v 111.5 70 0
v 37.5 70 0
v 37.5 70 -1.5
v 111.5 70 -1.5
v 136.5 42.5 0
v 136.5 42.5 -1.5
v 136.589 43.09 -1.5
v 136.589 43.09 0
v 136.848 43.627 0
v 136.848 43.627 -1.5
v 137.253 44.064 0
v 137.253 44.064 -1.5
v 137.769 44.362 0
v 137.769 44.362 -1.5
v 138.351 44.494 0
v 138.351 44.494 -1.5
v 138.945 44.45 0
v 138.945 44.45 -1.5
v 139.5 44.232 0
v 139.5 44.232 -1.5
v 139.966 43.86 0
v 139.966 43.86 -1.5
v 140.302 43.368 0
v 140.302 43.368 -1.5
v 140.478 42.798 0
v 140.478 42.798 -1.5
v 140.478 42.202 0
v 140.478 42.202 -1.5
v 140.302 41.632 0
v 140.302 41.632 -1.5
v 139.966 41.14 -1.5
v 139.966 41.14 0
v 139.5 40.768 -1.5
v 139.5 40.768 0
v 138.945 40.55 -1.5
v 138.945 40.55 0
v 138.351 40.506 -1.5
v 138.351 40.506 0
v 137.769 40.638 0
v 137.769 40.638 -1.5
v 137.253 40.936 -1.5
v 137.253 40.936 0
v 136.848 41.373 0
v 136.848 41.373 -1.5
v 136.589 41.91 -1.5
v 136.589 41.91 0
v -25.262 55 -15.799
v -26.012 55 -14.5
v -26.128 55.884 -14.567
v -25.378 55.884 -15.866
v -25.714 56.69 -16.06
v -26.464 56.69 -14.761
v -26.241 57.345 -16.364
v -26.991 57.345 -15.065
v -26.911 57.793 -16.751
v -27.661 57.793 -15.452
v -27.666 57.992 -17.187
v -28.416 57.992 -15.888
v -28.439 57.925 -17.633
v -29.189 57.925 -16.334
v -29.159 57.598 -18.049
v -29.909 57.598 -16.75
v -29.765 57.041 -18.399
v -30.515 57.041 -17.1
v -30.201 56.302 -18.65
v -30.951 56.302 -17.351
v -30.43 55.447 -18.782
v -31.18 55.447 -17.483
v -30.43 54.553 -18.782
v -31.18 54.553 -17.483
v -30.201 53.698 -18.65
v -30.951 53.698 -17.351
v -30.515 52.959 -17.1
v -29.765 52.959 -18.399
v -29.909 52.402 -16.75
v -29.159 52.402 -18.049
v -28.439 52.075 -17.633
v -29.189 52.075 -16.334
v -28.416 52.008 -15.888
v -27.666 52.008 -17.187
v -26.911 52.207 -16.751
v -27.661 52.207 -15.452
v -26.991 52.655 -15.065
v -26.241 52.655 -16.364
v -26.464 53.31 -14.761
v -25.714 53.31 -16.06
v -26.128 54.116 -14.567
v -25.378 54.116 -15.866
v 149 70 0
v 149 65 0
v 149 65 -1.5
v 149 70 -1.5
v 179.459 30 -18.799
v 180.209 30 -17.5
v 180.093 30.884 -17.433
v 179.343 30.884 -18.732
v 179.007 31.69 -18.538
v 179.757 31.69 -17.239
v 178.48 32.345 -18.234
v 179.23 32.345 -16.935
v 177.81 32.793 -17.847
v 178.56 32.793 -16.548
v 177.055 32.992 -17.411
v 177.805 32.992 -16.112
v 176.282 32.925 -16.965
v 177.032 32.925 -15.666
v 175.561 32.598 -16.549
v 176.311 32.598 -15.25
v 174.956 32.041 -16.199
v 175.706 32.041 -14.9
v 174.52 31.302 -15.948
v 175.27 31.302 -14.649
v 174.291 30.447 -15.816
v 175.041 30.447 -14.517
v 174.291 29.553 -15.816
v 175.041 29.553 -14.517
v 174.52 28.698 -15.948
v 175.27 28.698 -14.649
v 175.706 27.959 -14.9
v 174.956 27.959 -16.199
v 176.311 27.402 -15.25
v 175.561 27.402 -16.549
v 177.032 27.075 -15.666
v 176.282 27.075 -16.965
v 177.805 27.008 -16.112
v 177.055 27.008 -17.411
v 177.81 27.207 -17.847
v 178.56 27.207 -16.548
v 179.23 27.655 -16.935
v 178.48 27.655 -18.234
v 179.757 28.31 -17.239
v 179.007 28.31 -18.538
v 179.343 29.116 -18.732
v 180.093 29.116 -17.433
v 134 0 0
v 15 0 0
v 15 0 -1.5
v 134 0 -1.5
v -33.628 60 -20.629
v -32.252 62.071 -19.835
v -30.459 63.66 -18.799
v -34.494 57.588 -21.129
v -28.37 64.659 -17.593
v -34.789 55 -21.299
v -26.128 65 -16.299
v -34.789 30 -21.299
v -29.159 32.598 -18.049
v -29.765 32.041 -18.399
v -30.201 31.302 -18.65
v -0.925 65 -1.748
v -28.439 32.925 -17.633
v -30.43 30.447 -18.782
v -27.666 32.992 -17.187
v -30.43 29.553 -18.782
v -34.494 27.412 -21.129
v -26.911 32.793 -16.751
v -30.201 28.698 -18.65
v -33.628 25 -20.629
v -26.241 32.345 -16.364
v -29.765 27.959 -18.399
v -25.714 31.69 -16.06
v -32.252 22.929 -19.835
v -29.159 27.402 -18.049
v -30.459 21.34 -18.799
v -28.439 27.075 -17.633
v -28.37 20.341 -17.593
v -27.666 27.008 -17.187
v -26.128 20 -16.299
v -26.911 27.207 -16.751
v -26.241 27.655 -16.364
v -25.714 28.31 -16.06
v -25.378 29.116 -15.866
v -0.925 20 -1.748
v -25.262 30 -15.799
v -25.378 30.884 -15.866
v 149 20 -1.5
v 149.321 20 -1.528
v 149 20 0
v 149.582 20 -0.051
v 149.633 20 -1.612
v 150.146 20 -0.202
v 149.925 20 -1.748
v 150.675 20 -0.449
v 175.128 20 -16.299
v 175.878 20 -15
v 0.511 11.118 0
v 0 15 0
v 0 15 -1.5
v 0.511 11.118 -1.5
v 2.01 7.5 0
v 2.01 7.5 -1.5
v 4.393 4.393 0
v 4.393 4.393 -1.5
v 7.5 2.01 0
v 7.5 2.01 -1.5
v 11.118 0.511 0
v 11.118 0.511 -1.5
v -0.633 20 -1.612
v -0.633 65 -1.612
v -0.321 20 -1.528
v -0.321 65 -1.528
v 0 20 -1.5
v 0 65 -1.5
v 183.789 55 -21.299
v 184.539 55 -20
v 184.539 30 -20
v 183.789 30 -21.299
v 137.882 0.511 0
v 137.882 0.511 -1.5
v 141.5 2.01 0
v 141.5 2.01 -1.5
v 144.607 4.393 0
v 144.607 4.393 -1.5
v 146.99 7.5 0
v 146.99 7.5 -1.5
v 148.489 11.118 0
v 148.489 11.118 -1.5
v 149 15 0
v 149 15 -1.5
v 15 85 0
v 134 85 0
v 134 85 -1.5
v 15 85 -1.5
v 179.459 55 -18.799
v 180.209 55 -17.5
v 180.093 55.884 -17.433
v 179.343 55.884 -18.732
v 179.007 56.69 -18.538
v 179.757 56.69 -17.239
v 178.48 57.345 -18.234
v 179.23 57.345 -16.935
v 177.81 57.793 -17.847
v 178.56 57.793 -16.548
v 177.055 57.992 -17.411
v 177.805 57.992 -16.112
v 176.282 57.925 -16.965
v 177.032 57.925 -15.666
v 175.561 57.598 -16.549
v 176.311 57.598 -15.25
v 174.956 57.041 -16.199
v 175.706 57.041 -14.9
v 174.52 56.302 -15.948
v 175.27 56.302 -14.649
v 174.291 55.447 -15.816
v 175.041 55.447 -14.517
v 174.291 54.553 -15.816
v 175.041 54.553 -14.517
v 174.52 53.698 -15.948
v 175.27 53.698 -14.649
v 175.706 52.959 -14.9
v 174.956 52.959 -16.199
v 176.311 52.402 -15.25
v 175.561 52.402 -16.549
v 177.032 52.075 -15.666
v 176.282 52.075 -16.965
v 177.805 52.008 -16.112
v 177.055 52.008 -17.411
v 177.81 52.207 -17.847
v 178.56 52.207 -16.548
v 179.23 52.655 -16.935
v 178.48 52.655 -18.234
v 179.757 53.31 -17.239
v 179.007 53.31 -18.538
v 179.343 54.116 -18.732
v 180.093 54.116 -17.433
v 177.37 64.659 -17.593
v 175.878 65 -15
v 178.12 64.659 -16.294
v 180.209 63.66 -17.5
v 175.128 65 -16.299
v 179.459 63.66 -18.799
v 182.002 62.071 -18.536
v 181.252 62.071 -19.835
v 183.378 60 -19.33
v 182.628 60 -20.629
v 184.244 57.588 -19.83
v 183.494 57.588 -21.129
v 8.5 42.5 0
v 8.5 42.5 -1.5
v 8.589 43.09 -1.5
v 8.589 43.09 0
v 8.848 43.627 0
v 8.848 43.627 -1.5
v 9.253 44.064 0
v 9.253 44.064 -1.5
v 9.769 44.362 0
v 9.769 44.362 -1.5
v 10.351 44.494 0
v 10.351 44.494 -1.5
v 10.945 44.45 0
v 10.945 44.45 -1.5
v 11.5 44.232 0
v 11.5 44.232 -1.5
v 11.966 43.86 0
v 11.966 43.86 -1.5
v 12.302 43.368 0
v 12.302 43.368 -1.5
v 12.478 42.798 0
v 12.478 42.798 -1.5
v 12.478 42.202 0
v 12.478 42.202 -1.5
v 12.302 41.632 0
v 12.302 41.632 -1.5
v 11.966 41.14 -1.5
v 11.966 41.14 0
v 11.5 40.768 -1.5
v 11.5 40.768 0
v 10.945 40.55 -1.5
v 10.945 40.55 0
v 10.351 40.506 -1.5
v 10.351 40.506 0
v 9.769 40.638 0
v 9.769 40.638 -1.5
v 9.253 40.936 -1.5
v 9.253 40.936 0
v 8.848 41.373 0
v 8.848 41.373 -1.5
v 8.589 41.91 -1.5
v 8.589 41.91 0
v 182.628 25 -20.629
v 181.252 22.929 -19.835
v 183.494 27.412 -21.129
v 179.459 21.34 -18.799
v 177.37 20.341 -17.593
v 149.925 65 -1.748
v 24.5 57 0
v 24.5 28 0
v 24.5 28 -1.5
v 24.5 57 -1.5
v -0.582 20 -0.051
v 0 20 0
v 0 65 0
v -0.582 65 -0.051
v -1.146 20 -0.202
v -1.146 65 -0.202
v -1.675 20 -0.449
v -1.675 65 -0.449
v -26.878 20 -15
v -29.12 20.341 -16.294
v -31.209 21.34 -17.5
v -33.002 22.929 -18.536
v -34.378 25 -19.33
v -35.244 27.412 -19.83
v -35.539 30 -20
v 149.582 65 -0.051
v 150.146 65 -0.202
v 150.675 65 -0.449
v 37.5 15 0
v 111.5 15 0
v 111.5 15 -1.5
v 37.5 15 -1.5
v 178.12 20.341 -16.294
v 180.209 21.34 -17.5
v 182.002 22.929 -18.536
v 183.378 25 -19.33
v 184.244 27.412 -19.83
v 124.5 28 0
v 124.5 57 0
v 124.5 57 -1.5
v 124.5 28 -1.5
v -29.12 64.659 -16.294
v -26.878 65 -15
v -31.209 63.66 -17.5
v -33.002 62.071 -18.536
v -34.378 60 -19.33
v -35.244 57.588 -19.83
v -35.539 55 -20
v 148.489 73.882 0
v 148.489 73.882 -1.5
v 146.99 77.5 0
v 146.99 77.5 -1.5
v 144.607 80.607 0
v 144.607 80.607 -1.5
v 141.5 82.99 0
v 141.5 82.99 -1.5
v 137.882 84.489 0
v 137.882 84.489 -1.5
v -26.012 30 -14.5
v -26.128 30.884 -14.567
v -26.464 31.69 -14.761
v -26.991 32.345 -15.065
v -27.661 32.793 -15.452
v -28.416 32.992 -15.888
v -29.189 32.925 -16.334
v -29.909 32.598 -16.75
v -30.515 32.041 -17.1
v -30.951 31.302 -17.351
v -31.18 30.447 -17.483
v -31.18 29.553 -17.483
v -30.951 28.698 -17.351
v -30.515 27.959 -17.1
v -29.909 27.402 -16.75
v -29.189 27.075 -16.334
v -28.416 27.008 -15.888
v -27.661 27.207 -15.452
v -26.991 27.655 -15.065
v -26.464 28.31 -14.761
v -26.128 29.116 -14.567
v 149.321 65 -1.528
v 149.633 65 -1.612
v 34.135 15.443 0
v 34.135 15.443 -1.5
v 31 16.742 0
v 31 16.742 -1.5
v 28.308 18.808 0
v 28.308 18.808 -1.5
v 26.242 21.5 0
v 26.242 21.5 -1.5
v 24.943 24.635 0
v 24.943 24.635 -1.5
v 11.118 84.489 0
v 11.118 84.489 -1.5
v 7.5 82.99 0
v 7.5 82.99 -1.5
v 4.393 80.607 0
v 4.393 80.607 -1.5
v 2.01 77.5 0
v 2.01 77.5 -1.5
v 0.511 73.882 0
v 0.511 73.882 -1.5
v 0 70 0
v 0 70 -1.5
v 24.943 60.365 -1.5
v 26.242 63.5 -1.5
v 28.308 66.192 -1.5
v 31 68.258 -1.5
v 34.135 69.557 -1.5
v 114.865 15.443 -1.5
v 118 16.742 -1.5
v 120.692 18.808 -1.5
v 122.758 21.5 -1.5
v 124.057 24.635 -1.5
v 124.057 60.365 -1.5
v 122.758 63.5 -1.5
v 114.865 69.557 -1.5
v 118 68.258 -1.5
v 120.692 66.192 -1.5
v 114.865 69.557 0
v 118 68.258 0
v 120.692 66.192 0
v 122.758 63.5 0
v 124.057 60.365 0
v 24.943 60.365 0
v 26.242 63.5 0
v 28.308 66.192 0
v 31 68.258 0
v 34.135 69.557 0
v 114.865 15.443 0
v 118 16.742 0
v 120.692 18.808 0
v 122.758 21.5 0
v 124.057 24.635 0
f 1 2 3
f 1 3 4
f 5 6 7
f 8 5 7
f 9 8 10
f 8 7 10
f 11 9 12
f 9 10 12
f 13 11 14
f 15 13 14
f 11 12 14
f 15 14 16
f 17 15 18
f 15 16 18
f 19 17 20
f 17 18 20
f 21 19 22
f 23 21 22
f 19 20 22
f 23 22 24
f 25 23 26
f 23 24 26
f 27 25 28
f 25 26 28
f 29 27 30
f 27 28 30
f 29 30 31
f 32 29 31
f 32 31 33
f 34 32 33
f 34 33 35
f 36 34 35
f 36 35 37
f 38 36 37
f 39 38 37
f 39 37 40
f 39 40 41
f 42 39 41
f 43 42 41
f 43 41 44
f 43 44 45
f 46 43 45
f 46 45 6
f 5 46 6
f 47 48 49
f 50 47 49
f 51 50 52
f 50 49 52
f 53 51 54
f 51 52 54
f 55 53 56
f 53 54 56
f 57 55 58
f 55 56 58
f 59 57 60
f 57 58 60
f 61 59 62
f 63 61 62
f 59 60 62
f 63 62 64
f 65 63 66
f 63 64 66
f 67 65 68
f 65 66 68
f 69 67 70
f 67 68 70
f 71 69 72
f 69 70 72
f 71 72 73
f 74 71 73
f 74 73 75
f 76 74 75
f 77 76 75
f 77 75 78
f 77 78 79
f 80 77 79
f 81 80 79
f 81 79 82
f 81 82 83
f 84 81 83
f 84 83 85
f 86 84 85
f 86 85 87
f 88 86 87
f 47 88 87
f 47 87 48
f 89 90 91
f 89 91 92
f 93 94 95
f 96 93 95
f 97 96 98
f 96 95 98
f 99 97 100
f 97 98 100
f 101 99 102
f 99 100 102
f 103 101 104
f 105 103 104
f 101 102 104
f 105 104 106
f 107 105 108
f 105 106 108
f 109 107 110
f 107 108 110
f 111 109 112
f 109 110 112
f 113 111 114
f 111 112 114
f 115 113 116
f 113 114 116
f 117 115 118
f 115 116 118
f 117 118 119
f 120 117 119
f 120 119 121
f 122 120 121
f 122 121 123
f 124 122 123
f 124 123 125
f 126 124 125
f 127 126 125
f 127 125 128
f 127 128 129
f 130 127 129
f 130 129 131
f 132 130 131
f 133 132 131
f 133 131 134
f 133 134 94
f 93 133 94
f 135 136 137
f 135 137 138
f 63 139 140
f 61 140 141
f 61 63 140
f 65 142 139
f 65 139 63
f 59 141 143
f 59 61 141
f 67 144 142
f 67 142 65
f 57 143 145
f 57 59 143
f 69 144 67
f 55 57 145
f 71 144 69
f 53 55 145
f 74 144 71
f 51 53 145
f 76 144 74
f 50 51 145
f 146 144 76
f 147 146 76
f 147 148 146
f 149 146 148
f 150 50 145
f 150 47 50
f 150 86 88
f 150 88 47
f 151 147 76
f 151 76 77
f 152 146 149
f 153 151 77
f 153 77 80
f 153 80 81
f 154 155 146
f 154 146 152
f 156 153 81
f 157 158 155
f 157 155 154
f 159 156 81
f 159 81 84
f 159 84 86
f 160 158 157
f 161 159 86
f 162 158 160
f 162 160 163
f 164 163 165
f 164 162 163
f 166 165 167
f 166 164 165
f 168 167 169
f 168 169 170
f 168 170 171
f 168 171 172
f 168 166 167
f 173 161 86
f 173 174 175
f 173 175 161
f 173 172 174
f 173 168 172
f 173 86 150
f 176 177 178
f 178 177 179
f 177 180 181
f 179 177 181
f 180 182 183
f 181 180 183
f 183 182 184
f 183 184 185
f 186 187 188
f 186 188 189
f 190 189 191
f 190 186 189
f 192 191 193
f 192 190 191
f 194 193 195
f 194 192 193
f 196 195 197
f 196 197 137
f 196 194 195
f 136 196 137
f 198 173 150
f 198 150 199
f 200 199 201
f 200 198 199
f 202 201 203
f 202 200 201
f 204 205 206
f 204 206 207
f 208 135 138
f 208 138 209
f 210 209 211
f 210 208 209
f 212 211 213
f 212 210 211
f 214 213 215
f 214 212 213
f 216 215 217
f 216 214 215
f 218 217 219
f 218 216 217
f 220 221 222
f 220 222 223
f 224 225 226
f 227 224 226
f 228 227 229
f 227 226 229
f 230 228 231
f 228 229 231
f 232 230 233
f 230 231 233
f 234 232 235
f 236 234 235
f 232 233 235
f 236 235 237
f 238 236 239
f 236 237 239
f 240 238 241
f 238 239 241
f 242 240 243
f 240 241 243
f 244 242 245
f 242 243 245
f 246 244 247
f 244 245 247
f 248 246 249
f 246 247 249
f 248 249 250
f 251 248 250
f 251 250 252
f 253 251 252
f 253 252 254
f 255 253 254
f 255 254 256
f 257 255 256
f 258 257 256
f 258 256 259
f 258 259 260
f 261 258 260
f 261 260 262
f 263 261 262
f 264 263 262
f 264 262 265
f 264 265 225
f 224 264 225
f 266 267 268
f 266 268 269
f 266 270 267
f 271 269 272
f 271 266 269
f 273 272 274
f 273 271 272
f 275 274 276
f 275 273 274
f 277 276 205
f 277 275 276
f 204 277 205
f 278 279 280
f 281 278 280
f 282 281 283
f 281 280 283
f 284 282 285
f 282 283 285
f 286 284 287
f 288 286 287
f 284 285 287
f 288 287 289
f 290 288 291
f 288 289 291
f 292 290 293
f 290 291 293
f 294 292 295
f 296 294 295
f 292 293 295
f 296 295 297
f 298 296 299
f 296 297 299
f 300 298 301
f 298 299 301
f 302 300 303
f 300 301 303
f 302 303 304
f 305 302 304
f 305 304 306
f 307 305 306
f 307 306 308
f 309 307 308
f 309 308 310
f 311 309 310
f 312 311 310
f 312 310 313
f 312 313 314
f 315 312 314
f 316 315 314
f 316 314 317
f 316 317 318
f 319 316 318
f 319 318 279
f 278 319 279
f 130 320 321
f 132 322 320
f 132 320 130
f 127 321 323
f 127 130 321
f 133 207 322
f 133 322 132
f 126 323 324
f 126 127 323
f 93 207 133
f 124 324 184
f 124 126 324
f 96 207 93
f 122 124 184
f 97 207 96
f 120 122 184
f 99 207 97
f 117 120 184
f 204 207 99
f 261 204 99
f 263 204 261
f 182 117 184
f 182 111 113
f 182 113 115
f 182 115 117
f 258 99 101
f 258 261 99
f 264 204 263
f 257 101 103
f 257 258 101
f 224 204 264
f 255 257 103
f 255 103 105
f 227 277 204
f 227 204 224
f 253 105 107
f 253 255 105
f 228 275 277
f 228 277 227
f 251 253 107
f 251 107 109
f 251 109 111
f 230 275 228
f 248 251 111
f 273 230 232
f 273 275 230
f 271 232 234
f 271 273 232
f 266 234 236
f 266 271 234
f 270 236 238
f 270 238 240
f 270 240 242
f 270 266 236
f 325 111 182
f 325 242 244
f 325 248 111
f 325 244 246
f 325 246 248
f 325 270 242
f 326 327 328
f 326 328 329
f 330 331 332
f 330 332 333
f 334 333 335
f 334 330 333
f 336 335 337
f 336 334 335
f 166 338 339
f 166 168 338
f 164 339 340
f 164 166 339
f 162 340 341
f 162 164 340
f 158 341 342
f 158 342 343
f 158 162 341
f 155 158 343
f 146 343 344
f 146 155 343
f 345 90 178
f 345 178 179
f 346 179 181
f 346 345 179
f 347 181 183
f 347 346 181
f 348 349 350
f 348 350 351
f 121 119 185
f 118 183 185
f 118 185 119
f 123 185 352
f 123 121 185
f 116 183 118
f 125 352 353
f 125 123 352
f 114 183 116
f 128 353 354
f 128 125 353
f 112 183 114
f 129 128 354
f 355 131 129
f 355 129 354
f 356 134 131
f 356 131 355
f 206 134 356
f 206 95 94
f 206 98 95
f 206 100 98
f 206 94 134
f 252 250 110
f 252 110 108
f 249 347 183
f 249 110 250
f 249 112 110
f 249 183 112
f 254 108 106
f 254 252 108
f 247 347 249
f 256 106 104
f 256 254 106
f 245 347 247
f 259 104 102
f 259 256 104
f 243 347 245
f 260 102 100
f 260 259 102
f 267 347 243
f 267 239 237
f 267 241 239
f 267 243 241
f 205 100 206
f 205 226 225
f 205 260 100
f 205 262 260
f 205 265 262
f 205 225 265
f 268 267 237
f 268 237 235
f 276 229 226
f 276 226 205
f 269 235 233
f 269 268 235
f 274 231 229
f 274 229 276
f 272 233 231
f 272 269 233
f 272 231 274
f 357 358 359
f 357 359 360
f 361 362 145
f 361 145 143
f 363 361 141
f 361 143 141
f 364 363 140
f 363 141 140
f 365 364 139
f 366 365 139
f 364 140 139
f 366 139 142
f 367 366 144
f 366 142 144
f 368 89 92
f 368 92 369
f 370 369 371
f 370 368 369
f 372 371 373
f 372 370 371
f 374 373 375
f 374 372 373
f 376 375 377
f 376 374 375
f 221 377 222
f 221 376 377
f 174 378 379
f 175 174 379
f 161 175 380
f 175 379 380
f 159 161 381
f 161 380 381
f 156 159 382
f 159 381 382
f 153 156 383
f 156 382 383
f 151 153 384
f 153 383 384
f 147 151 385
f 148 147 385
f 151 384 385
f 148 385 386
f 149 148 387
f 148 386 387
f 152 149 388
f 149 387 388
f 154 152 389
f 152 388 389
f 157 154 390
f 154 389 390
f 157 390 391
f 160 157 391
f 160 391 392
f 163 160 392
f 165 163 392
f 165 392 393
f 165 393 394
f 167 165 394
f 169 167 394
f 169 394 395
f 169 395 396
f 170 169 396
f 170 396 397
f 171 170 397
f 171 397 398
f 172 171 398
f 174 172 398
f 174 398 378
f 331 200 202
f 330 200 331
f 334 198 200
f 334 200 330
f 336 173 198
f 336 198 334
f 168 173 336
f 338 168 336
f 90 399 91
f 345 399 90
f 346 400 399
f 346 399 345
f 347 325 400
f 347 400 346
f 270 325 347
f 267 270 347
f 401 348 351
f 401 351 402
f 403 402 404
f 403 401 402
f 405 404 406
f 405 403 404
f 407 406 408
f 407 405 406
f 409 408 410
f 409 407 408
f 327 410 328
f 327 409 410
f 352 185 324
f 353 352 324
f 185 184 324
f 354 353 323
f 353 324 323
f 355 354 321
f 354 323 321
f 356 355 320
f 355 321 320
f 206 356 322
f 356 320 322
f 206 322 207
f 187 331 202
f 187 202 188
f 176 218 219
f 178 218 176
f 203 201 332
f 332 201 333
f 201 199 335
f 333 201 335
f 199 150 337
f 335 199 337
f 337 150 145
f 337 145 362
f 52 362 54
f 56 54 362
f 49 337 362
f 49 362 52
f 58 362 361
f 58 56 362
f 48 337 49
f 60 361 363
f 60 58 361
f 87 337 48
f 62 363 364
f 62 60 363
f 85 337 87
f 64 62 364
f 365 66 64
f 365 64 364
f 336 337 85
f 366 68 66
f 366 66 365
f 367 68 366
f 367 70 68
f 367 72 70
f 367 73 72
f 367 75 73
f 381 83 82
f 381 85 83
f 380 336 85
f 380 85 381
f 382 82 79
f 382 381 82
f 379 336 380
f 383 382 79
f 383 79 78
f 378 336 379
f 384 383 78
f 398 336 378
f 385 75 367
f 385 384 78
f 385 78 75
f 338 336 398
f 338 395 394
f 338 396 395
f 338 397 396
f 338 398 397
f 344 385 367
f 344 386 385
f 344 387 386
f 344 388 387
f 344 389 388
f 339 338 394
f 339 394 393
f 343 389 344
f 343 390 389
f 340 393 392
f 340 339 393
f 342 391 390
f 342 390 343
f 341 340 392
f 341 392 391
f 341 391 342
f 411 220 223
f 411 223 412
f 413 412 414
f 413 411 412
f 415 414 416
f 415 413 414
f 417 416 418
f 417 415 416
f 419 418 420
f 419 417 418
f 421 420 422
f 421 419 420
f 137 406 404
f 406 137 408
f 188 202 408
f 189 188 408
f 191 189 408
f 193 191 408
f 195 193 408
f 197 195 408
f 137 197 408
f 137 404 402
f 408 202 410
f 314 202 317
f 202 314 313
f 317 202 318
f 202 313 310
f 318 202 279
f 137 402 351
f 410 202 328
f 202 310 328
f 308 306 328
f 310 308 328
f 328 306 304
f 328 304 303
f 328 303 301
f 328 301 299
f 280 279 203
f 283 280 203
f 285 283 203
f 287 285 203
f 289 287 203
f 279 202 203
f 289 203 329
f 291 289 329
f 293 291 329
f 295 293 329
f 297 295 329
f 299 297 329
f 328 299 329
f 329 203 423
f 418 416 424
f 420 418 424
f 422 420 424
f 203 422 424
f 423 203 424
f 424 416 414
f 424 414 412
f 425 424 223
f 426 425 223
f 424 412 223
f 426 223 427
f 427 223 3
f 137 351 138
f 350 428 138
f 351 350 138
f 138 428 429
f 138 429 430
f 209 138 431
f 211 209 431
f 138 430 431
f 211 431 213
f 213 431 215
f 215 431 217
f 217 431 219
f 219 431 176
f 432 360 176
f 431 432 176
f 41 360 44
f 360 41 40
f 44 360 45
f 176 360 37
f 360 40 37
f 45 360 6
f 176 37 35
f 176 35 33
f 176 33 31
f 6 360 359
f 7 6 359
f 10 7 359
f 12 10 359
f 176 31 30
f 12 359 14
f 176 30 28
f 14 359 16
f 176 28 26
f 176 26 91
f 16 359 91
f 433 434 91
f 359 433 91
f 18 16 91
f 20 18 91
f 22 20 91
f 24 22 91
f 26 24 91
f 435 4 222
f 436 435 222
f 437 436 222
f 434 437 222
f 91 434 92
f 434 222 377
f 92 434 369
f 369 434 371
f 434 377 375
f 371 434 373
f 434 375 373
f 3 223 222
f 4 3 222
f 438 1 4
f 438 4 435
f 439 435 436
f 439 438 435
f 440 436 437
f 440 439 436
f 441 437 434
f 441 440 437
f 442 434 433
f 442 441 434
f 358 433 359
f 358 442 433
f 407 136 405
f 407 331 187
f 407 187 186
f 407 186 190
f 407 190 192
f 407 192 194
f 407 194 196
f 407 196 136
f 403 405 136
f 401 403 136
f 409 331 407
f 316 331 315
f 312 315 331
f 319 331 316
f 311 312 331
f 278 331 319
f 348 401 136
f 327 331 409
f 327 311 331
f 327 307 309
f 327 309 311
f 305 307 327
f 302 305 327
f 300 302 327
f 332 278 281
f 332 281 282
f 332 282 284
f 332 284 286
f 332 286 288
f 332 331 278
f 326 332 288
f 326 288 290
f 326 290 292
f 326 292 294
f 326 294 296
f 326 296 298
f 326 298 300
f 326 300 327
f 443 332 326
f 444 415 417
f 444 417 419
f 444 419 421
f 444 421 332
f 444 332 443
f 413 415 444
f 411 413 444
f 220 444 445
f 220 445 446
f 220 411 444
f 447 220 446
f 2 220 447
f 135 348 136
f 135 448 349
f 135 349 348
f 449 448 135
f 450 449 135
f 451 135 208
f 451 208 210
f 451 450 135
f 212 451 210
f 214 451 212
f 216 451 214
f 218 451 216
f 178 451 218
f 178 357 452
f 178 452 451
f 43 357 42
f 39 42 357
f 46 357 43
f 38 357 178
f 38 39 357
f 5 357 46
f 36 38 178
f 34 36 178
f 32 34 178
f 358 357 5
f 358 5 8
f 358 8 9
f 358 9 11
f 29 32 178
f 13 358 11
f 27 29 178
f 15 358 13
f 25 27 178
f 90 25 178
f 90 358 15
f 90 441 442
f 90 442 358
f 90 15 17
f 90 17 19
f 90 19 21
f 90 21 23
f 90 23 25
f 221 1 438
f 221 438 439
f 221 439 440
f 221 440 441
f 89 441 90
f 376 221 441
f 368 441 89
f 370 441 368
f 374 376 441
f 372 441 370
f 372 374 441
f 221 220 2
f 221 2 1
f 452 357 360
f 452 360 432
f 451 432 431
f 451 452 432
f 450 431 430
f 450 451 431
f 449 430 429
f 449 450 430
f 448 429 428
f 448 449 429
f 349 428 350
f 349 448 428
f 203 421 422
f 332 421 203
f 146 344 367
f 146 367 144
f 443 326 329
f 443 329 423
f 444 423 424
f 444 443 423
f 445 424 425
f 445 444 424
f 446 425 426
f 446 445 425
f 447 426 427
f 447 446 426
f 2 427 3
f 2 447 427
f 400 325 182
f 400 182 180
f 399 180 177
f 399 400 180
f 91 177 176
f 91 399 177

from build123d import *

# Parameters (mm, degrees)
BASE_FLANGE1_DEPTH          = 1.5
SM_EDGE_FLANGE_1_DEPTH      = 45
SM_EDGE_FLANGE_1_BEND_DEPTH = 45
SKETCH12_R                  = 3
CUT_EXTRUDE1_DEPTH          = 10
FILLET1_R                   = 10
SKETCH13_R                  = 3
CUT_EXTRUDE2_DEPTH          = 10
SKETCH14_R                  = 2
CUT_EXTRUDE3_DEPTH          = 10


# Sheet-metal steps are written as plain solids
with BuildPart() as part:
    # Sketch1 → Base-Flange1 (new body)
    with BuildSketch(Plane.XY):
        with BuildLine():
            Line((15, 0), (134, 0))
            ThreePointArc((134, 0), (144.606601718, 4.393398282), (149, 15))
            Line((149, 15), (149, 70))
            ThreePointArc((149, 70), (144.606601718, 80.606601718), (134, 85))
            Line((134, 85), (15, 85))
            ThreePointArc((15, 85), (4.393398282, 80.606601718), (0, 70))
            Line((0, 70), (0, 15))
            ThreePointArc((0, 15), (4.393398282, 4.393398282), (15, 0))
        make_face()
        with BuildLine():
            Line((111.5, 15), (37.5, 15))
            ThreePointArc((37.5, 15), (28.307611845, 18.807611845), (24.5, 28))
            Line((24.5, 28), (24.5, 57))
            ThreePointArc((24.5, 57), (28.307611845, 66.192388155), (37.5, 70))
            Line((37.5, 70), (111.5, 70))
            ThreePointArc((111.5, 70), (120.692388155, 66.192388155), (124.5, 57))
            Line((124.5, 57), (124.5, 28))
            ThreePointArc((124.5, 28), (120.692388155, 18.807611845), (111.5, 15))
        make_face(mode=Mode.SUBTRACT)
    extrude(amount=-BASE_FLANGE1_DEPTH)

    # Ребро-кромка1 section (across the edge) → Ребро-кромка1 (add)
    with BuildSketch(Plane(origin=(-0.495706006, 20, -1.5), x_dir=(0.49999999999999495, 0, -0.8660254037844416), z_dir=(0, 1, 0))):
        with BuildLine():
            Line((-1.5, 0.495706006), (-1.5, 39.598076211))
            Line((-1.5, 39.598076211), (0, 39.598076211))
            Line((0, 39.598076211), (0, 0.495706006))
            ThreePointArc((0, 0.495706006), (0.063037221, 0.016890773), (0.247853003, -0.429293994))
            Line((0.247853003, -0.429293994), (-1.051185103, -1.179293994))
            ThreePointArc((-1.051185103, -1.179293994), (-1.385851518, -0.371337795), (-1.5, 0.495706006))
        make_face()
    extrude(amount=SM_EDGE_FLANGE_1_DEPTH)

    # Ребро-кромка1 section 2 (across the edge) → Ребро-кромка1 bend (add)
    with BuildSketch(Plane(origin=(149.495706006, 65, -1.5), x_dir=(-0.49999999999999495, 0, -0.8660254037844416), z_dir=(0, -1, 0))):
        with BuildLine():
            Line((-1.5, 0.495706006), (-1.5, 39.598076211))
            Line((-1.5, 39.598076211), (0, 39.598076211))
            Line((0, 39.598076211), (0, 0.495706006))
            ThreePointArc((0, 0.495706006), (0.063037221, 0.016890773), (0.247853003, -0.429293994))
            Line((0.247853003, -0.429293994), (-1.051185103, -1.179293994))
            ThreePointArc((-1.051185103, -1.179293994), (-1.385851518, -0.371337795), (-1.5, 0.495706006))
        make_face()
    extrude(amount=SM_EDGE_FLANGE_1_BEND_DEPTH)

    # Sketch12 → Cut-Extrude1 (cut)
    with BuildSketch(Plane(origin=(37.474407449, 0, 64.907577685), x_dir=(0.8660254037844416, 0, -0.49999999999999517), z_dir=(0.49999999999999517, 0, 0.8660254037844416))):
        with Locations((161.815155369, 30)):
            Circle(SKETCH12_R)
        with Locations((161.815155369, 55)):
            Circle(SKETCH12_R)
    extrude(amount=-CUT_EXTRUDE1_DEPTH, mode=Mode.SUBTRACT)

    # Fillet1
    fillet1_edges = [part.edges().sort_by_distance(p)[0] for p in [
        (-35.163645946, 20, -20.649519053),
        (-35.163645946, 65, -20.649519053),
        (184.163645946, 65, -20.649519053),
        (184.163645946, 20, -20.649519053),
    ]]
    fillet(fillet1_edges, radius=FILLET1_R)

    # Sketch13 → Cut-Extrude2 (cut)
    with BuildSketch(Plane(origin=(-0.224407449, 0, 0.388685103), x_dir=(0.8660254037844416, 0, 0.49999999999999517), z_dir=(-0.49999999999999517, 0, 0.8660254037844416))):
        with Locations((-32.777370205, 30)):
            Circle(SKETCH13_R)
        with Locations((-32.777370205, 55)):
            Circle(SKETCH13_R)
    extrude(amount=-CUT_EXTRUDE2_DEPTH, mode=Mode.SUBTRACT)

    # Sketch14 → Cut-Extrude3 (cut)
    with BuildSketch(Plane(origin=(0, 0, -1.5), x_dir=(-1, 0, 0), z_dir=(0, 0, -1))):
        with Locations((-138.5, 42.5)):
            Circle(SKETCH14_R)
        with Locations((-10.5, 42.5)):
            Circle(SKETCH14_R)
    extrude(amount=-CUT_EXTRUDE3_DEPTH, mode=Mode.SUBTRACT)


solid = part.part
